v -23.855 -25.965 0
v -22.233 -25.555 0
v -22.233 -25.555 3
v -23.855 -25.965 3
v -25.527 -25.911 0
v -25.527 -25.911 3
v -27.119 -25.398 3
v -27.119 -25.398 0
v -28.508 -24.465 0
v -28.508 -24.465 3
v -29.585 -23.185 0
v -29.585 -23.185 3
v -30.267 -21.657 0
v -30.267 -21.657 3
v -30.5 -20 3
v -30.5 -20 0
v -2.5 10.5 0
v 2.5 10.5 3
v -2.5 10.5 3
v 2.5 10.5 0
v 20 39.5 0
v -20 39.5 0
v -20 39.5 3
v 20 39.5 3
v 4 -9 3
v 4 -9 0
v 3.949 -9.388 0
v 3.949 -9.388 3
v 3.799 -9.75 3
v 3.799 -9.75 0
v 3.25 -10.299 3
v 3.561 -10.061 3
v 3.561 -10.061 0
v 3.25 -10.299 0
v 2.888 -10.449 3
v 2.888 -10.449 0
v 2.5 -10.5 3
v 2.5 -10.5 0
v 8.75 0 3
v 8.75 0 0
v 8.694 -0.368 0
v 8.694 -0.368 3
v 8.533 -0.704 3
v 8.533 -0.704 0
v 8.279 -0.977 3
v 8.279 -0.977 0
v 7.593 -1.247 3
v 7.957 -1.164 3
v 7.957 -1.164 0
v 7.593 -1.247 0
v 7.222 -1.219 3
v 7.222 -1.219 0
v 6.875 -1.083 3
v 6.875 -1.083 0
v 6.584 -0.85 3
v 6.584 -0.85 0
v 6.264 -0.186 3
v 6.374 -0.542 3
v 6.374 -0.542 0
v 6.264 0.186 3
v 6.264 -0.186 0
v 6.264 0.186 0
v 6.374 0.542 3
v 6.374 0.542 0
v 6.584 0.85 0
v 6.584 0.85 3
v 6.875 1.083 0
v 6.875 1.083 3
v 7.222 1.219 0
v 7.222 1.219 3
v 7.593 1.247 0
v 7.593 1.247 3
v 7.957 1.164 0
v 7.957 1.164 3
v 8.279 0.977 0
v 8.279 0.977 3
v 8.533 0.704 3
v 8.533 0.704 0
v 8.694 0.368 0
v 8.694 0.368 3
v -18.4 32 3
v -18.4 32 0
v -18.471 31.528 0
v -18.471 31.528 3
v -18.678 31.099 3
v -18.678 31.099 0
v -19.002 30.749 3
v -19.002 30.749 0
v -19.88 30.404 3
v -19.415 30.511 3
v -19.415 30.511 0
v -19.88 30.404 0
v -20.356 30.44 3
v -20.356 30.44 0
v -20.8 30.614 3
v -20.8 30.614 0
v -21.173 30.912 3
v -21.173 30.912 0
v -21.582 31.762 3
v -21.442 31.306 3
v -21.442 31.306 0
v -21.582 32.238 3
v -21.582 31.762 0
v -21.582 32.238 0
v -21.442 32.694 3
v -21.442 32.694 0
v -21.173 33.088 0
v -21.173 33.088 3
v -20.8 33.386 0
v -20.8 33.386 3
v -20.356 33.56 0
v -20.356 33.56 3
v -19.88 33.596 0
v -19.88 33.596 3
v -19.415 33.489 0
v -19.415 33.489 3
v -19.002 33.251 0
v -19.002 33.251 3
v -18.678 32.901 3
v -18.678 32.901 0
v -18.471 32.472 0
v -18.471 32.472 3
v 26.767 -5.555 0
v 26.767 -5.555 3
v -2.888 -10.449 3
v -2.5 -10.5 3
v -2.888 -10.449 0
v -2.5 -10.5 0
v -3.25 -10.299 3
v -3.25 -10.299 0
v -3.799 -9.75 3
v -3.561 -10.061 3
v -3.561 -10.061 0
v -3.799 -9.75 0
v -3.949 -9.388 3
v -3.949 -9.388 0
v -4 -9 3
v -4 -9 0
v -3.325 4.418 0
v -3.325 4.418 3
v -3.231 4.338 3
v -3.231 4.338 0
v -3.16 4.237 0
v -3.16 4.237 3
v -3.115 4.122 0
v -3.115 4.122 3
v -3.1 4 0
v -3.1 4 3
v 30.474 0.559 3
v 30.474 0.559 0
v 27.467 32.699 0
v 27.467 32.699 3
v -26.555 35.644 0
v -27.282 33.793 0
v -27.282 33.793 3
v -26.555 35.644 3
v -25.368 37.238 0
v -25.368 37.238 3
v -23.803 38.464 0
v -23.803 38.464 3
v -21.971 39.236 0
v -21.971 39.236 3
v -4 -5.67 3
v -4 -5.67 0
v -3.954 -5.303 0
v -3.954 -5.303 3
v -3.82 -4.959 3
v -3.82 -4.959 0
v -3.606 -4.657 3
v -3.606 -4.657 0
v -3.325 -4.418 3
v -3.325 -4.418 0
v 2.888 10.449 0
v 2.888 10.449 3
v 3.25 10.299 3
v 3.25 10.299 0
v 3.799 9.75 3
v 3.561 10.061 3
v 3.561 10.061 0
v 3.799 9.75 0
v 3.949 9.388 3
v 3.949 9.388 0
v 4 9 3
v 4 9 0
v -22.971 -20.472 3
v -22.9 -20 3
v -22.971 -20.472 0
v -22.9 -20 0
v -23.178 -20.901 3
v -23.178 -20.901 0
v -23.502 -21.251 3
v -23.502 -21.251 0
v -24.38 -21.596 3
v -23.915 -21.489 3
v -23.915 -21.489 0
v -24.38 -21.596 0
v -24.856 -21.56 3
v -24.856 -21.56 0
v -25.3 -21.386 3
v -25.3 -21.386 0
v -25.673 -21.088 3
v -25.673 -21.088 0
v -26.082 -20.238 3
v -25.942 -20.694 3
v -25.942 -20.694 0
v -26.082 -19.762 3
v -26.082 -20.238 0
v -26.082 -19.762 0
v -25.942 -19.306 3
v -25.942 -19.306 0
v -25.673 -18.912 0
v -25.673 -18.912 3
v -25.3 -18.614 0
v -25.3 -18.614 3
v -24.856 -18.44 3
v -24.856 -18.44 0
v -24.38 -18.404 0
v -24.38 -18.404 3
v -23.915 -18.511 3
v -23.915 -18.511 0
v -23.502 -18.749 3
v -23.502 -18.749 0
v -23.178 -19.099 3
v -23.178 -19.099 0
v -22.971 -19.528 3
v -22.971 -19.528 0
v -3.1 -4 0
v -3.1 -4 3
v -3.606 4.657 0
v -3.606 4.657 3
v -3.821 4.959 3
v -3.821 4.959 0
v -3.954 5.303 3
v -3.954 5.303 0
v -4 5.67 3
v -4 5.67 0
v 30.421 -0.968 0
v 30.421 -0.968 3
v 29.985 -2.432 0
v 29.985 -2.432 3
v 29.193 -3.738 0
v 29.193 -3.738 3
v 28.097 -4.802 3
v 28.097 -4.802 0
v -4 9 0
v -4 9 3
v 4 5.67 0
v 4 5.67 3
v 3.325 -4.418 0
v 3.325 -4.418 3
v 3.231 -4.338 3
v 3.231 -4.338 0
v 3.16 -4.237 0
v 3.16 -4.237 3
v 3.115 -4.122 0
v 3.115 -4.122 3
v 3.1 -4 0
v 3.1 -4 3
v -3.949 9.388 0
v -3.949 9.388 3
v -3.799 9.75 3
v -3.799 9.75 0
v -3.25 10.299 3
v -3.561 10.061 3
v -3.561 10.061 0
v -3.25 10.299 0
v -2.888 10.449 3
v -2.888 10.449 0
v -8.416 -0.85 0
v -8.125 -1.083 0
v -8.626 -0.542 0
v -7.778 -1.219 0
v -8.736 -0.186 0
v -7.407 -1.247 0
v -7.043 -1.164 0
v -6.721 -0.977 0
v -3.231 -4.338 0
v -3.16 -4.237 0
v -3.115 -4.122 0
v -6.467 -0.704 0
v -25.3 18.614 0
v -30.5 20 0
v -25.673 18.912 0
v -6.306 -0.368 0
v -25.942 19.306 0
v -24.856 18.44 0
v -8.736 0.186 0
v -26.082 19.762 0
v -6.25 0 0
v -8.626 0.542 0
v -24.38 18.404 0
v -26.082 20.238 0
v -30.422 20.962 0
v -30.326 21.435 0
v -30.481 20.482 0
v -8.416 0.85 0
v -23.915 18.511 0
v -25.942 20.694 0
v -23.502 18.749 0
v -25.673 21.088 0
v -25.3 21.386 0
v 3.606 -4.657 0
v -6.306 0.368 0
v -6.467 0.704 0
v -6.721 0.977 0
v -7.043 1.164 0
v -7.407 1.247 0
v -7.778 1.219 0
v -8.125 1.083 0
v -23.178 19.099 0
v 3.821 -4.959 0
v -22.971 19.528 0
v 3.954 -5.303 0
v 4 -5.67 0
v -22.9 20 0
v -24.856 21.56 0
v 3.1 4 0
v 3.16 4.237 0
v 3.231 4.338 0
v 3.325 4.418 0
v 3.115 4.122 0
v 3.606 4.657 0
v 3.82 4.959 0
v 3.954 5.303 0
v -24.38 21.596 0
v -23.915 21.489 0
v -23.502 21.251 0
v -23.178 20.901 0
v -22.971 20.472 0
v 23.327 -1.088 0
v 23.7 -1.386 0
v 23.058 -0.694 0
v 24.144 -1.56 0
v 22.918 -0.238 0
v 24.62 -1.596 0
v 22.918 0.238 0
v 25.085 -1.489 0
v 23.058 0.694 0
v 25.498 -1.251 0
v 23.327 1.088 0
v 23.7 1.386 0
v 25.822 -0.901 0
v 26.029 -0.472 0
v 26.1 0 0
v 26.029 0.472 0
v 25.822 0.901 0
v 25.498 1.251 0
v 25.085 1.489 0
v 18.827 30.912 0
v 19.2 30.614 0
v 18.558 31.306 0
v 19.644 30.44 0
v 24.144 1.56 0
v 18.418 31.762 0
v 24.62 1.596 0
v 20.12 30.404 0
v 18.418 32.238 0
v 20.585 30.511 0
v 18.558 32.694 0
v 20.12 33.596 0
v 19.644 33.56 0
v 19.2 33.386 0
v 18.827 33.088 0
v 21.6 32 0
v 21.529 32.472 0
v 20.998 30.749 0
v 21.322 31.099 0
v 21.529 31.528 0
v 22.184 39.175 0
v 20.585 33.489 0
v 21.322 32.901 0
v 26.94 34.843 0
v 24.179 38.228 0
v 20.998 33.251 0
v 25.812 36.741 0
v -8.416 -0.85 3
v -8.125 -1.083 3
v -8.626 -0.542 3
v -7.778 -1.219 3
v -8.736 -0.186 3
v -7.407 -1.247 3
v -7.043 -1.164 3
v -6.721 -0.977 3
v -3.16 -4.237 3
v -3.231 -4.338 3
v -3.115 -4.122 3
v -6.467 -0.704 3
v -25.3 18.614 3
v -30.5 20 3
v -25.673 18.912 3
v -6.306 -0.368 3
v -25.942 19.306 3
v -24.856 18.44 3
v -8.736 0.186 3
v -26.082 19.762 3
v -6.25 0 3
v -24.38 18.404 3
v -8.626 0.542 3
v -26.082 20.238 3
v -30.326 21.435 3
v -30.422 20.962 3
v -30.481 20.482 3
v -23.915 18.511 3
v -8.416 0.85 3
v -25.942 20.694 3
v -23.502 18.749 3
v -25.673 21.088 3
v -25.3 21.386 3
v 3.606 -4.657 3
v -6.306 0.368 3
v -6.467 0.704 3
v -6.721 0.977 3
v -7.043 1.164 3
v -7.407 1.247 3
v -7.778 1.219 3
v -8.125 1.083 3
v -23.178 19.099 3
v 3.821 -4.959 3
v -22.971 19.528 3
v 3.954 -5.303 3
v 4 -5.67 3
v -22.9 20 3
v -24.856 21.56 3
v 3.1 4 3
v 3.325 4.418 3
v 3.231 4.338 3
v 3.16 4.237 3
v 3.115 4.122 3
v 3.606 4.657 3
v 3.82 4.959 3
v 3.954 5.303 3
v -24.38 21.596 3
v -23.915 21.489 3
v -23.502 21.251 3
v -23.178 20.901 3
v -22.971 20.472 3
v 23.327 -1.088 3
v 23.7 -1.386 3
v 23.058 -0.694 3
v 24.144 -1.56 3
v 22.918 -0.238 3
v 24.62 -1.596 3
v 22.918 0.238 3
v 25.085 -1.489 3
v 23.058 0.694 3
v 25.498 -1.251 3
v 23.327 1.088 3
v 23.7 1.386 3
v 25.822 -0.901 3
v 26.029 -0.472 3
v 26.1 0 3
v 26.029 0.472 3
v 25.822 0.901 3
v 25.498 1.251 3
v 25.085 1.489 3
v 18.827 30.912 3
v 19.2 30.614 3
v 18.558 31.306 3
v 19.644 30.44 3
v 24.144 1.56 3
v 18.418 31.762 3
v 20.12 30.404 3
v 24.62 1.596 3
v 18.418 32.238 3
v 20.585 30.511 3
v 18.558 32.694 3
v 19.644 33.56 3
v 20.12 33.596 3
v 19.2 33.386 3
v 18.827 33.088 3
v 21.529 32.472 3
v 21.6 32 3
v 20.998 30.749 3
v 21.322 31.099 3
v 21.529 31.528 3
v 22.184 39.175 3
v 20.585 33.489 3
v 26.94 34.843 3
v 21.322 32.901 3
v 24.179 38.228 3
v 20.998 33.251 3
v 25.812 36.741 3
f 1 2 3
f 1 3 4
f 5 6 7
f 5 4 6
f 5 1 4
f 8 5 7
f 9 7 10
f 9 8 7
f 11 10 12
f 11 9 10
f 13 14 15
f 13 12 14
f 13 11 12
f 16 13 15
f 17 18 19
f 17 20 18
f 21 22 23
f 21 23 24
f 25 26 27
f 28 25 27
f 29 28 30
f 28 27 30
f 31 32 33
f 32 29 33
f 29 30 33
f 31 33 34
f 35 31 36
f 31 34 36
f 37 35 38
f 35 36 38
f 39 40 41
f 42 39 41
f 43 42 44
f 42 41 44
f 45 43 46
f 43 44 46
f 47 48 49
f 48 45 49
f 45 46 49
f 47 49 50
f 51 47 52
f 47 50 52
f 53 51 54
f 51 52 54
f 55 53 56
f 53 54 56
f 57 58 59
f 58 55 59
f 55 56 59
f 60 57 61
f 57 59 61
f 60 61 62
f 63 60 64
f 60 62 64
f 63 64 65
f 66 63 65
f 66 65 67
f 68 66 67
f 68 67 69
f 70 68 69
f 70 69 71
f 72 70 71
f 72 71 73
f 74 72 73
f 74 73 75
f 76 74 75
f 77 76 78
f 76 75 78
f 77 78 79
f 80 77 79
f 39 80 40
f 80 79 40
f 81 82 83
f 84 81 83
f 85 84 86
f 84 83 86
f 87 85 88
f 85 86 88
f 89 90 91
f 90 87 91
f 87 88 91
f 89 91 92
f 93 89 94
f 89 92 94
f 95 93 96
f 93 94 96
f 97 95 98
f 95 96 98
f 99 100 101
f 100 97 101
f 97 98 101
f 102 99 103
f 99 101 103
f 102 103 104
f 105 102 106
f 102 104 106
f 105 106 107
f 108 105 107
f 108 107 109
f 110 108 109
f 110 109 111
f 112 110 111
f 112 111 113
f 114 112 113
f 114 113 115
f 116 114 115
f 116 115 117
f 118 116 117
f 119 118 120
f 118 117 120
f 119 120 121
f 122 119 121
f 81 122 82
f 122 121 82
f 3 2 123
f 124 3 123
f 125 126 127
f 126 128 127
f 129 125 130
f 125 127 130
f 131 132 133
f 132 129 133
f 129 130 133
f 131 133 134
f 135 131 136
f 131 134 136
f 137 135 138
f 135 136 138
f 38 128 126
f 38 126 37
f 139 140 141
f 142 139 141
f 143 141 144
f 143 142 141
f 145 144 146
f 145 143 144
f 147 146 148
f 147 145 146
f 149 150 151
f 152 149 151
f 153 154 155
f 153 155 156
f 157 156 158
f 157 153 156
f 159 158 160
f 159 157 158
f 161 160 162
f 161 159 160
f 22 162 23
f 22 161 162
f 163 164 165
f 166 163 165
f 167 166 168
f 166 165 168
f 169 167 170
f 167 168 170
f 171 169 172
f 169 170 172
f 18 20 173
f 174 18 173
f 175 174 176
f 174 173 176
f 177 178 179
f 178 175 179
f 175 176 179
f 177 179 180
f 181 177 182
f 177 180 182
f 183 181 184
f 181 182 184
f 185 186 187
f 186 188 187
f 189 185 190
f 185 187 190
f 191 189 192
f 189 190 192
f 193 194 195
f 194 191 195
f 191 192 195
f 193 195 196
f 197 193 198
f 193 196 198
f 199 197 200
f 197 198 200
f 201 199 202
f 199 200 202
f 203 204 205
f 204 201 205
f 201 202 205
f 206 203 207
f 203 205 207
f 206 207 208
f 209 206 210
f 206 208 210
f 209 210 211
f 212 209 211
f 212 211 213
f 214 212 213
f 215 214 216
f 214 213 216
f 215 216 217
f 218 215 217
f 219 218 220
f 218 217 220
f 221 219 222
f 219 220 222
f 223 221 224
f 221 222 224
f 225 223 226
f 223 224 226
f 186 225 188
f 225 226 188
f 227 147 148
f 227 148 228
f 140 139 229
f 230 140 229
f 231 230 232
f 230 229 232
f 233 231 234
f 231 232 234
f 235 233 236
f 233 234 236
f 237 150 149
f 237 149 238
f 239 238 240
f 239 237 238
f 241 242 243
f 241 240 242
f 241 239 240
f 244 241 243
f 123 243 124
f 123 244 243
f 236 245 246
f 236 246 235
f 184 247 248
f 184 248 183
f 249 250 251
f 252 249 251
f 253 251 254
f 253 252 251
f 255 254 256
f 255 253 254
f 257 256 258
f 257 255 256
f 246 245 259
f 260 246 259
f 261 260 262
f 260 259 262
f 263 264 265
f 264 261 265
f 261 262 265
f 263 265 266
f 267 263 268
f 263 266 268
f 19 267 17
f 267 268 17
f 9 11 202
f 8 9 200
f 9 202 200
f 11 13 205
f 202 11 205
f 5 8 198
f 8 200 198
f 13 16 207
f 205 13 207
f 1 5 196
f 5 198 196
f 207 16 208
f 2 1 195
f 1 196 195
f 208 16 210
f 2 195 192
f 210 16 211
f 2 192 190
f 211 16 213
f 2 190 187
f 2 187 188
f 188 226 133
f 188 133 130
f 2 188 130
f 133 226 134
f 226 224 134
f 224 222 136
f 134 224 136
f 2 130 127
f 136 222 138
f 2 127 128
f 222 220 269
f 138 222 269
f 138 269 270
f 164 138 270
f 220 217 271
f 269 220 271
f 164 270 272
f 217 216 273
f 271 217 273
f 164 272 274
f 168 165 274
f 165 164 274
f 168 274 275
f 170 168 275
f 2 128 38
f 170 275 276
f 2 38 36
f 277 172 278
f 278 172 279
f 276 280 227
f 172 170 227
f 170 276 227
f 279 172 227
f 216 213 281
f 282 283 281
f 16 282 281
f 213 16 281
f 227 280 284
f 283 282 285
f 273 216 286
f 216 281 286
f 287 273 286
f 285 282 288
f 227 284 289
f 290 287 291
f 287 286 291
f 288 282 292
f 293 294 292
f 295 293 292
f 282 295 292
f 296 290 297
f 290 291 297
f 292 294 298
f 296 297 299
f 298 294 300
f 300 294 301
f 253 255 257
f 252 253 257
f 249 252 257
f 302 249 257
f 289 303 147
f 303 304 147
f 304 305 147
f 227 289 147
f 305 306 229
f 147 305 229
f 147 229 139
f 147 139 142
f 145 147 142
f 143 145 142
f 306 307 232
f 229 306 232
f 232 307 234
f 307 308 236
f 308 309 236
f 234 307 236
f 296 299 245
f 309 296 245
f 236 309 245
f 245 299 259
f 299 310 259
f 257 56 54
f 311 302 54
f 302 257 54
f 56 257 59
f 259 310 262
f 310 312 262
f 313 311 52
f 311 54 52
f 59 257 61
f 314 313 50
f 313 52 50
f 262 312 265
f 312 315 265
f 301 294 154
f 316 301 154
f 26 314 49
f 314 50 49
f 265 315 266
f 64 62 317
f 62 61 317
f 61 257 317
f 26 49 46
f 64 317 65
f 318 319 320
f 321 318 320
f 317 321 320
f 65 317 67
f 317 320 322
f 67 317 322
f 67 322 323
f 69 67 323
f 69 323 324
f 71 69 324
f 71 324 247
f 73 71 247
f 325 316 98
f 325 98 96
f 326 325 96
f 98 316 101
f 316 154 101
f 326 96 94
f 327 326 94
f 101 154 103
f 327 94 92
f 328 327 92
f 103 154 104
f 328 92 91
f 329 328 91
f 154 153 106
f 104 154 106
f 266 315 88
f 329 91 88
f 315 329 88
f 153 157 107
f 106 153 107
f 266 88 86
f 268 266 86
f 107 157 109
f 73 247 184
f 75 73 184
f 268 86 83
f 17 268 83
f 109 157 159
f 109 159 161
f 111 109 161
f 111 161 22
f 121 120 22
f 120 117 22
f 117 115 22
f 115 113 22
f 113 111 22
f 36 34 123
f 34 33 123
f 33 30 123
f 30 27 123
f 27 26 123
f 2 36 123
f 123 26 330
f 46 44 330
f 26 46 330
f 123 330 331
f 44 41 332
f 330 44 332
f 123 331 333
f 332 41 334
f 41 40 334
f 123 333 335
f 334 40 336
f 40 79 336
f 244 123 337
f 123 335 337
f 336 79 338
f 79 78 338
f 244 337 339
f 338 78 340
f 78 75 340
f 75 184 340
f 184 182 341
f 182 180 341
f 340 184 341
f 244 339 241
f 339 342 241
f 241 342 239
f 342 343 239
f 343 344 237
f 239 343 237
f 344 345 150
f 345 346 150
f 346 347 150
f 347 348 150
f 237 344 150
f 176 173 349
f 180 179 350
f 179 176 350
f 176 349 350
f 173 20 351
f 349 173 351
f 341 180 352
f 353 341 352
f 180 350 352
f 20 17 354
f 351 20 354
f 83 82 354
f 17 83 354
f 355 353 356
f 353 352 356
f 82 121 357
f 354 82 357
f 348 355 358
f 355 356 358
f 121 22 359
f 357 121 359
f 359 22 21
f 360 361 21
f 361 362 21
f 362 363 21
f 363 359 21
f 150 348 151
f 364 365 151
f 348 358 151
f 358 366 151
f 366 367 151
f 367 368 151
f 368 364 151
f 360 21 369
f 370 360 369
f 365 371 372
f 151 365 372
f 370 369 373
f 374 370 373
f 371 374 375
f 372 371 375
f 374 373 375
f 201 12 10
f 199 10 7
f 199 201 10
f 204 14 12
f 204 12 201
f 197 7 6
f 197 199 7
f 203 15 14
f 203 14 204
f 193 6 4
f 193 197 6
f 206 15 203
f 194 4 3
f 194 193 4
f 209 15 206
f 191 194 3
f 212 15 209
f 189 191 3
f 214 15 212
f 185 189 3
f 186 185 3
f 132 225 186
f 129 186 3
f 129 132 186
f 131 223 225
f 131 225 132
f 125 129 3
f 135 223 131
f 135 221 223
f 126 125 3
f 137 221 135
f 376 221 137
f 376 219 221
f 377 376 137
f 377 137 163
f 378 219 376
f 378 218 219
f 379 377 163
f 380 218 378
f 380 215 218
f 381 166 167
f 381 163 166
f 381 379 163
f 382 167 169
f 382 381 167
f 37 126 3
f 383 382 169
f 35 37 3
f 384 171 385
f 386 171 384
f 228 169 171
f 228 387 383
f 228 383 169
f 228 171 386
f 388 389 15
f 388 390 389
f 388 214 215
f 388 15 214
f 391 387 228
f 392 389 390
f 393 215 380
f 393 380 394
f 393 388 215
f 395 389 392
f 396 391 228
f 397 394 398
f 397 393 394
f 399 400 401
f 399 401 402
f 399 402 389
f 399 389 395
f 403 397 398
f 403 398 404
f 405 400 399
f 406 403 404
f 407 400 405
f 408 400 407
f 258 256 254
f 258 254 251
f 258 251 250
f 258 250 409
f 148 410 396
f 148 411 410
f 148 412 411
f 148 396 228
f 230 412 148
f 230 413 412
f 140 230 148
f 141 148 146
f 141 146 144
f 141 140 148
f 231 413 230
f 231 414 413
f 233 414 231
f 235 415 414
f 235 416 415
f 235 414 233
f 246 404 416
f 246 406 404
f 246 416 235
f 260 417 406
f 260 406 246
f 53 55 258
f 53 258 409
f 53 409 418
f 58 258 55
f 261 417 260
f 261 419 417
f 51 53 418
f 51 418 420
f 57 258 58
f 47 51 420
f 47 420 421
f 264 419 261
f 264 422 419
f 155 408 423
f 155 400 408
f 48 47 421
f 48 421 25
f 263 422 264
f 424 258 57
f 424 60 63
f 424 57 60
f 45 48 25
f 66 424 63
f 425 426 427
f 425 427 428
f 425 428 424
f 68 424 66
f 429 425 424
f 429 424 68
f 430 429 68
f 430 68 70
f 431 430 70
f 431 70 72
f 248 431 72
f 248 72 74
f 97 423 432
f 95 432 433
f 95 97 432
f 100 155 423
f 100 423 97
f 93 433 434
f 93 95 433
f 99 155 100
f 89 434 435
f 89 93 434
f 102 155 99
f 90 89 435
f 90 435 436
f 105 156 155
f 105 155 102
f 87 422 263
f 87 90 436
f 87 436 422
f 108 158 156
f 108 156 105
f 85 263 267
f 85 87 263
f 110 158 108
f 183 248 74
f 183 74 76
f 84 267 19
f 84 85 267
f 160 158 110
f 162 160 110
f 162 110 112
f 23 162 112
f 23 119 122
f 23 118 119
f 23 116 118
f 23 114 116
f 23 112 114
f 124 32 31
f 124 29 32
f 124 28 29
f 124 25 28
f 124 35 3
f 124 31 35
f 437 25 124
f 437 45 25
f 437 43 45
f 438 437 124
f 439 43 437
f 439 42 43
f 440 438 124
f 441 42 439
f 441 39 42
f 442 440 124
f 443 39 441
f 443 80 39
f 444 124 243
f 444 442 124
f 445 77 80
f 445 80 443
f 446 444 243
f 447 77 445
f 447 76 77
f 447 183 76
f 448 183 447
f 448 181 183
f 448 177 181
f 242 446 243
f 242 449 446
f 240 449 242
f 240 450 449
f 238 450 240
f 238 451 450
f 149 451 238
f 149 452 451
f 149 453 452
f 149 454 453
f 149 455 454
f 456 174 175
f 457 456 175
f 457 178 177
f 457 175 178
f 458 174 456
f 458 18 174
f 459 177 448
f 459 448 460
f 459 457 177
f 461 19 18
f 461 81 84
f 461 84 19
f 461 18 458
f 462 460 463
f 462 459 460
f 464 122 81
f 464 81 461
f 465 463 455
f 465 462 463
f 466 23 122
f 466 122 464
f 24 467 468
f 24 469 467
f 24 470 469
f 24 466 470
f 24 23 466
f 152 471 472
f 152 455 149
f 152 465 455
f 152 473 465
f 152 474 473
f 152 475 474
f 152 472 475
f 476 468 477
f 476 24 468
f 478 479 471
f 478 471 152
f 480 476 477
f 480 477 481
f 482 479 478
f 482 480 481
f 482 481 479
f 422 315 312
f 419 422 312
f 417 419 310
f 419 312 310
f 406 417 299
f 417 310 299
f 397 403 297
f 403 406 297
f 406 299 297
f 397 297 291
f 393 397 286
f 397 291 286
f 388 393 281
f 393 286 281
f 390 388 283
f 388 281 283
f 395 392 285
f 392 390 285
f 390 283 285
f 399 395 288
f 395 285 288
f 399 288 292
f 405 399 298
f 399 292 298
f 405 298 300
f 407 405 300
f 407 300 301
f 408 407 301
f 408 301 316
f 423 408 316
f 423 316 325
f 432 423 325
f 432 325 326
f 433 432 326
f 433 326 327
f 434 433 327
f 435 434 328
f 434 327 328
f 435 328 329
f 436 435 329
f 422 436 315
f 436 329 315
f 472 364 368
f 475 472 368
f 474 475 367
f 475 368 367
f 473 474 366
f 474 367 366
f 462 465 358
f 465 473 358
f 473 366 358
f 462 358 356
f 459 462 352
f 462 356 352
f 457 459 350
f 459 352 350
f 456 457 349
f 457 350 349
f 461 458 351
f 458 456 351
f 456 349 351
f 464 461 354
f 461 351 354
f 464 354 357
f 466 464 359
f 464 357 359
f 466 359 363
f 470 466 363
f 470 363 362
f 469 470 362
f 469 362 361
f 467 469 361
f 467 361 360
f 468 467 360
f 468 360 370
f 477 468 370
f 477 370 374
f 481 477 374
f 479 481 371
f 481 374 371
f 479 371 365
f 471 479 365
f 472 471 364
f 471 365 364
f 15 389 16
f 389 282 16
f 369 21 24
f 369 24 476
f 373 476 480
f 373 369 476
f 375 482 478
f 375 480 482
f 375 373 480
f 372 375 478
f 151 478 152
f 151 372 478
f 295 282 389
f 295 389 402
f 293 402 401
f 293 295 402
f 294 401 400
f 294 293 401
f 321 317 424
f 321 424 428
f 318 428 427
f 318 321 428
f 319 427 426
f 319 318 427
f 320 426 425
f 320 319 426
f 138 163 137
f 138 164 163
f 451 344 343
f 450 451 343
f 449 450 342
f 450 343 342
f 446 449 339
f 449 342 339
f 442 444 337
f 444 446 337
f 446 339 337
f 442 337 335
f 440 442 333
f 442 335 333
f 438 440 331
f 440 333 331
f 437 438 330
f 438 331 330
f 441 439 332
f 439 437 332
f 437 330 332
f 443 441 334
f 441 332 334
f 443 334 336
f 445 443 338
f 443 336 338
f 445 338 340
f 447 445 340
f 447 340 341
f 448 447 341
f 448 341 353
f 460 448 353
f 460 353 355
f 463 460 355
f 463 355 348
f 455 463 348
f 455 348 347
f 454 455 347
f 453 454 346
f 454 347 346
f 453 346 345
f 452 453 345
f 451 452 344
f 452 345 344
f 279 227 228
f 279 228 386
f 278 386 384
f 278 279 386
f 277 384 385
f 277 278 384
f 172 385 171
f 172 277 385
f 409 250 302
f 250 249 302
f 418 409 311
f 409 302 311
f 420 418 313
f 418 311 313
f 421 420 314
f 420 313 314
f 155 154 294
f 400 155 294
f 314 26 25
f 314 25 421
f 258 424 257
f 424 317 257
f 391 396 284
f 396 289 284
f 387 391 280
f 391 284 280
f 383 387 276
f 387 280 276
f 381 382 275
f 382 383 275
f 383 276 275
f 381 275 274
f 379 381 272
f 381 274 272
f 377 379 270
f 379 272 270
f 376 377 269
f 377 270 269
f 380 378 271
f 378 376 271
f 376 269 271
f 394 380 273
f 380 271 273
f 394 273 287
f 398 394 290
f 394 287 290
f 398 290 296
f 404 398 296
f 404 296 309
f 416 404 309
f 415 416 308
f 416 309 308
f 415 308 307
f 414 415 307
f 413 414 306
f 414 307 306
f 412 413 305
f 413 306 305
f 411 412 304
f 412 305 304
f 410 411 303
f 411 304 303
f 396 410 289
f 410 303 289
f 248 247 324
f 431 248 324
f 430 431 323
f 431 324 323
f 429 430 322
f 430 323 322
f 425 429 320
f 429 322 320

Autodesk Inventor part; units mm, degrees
ref_plane "YZ Plane" through (0, 0, 0) normal (1, 0, 0) x (0, 1, 0)
ref_plane "XZ Plane" through (0, 0, 0) normal (0, 1, 0) x (-1, 0, 0)
ref_plane "XY Plane" through (0, 0, 0) normal (0, 0, 1) x (1, 0, 0)
sketch "スケッチ1" plane through (0, 0, 0) normal (0, 0, 1) x (1, 0, 0)
  line L0 (-15, 61.4764) -> (15, 61.4764) construction
  line L1 (15, 61.4764) -> (15, -42.9448) construction
  line L2 (15, -42.9448) -> (-15, -42.9448) construction
  line L3 (-15, -42.9448) -> (-15, 61.4764) construction
  circle A0 centre (-24.5, 20) radius 9.5 construction
  circle A1 centre (24.5, 0) radius 9.5 construction
  circle A2 centre (-24.5, -20) radius 9.5 construction
  line L4 (-3, 9.5) -> (3, 9.5) construction
  line L5 (3, 9.5) -> (3, -9.5) construction
  line L6 (3, -9.5) -> (-3, -9.5) construction
  line L7 (-3, -9.5) -> (-3, 9.5) construction
  circle A3 centre (-7.5, 0) radius 1.25
  circle A4 centre (7.5, 0) radius 1.25
  circle A5 centre (-20, 32) radius 1.6
  circle A6 centre (20, 32) radius 1.6
  line L8 (-24.5, 20) -> (-24.5, -20) construction
  line L9 (-24.5, -20) -> (24.5, 0) construction
  line L10 (24.5, 0) -> (-24.5, 20) construction
  line L11 (-61.4764, 39.5) -> (49.785, 39.5) construction
  line L12 (49.785, 39.5) -> (49.785, 24.5) construction
  line L13 (49.785, 24.5) -> (-61.4764, 24.5) construction
  line L14 (-61.4764, 24.5) -> (-61.4764, 39.5) construction
  circle A7 centre (-24.5, 20) radius 1.6
  circle A8 centre (24.5, 0) radius 1.6
  circle A9 centre (-24.5, -20) radius 1.6
  arc A10 (-20, 39.5) -> (-27.2824, 33.7934) centre (-20, 32) ccw
  arc A11 (27.4674, 32.6985) -> (20, 39.5) centre (20, 32) ccw
  arc A12 (-30.3259, 21.4347) -> (-30.5, 20) centre (-24.5, 20) ccw
  arc A13 (-30.5, -20) -> (-22.2326, -25.5551) centre (-24.5, -20) ccw
  arc A14 (26.7674, -5.5551) -> (30.4739, 0.5588) centre (24.5, 0) ccw
  line L15 (-20, 39.5) -> (20, 39.5)
  line L16 (-27.2824, 33.7934) -> (-30.3259, 21.4347)
  line L17 (-30.5, 20) -> (-30.5, -20)
  line L18 (-22.2326, -25.5551) -> (26.7674, -5.5551)
  line L19 (30.4739, 0.5588) -> (27.4674, 32.6985)
  line L20 (-2.5, -10.5) -> (2.5, -10.5)
  line L21 (4, -9) -> (4, -5.6703)
  line L22 (2.5, 10.5) -> (-2.5, 10.5)
  line L23 (-3.1, 4) -> (-3.1, -4)
  line L24 (3.1, 4) -> (3.1, -4)
  line L25 (-4, -5.6703) -> (-4, -9)
  line L26 (4, 5.6703) -> (4, 9)
  arc A15 (-2.5, 10.5) -> (-4, 9) centre (-2.5, 9) ccw
  arc A16 (4, 9) -> (2.5, 10.5) centre (2.5, 9) ccw
  arc A17 (-4, -9) -> (-2.5, -10.5) centre (-2.5, -9) ccw
  arc A18 (2.5, -10.5) -> (4, -9) centre (2.5, -9) ccw
  line L27 (-4, 9) -> (-4, 5.6703)
  arc A19 (-4, 5.6703) -> (-3.325, 4.4176) centre (-2.5, 5.6703) ccw
  arc A20 (-3.1, 4) -> (-3.325, 4.4176) centre (-3.6, 4) ccw
  arc A21 (3.325, 4.4176) -> (4, 5.6703) centre (2.5, 5.6703) ccw
  arc A22 (3.325, 4.4176) -> (3.1, 4) centre (3.6, 4) ccw
  arc A23 (-3.325, -4.4176) -> (-4, -5.6703) centre (-2.5, -5.6703) ccw
  arc A24 (-3.325, -4.4176) -> (-3.1, -4) centre (-3.6, -4) ccw
  arc A25 (3.1, -4) -> (3.325, -4.4176) centre (3.6, -4) ccw
  arc A26 (4, -5.6703) -> (3.325, -4.4176) centre (2.5, -5.6703) ccw
  circle A27 centre (-24.5, 20) radius 4 construction
  point P0 (0, 0)
  dimension "d0" = 30
  dimension "d1" = 15
  dimension "d2" = 19
  dimension "d3" = 19
  dimension "d4" = 19
  dimension "d5" = 6
  dimension "d6" = 19
  dimension "d7" = 3
  dimension "d8" = 9.5
  dimension "d9" = 2.5
  dimension "d10" = 2.5
  dimension "d11" = 15
  dimension "d12" = 7.5
  dimension "d13" = 3.2
  dimension "d14" = 3.2
  dimension "d15" = 40
  dimension "d16" = 40
  dimension "d17" = 20
  dimension "d18" = 12
  dimension "d19" = 15
  dimension "d20" = 7.5
  dimension "d21" = 3.2
  dimension "d22" = 3.2
  dimension "d23" = 3.2
  dimension "d24" = 7.5
  dimension "d25" = 7.5
  dimension "d26" = 6
  dimension "d27" = 6
  dimension "d28" = 6
  dimension "d29" = 1
  dimension "d32" = 8
  dimension "d33" = 4
  dimension "d34" = 0.1
  dimension "d35" = 0.1
  dimension "d36" = 1
  dimension "d37" = 1
  dimension "d38" = 1
  dimension "d39" = 1.5
  dimension "d40" = 1
  dimension "d41" = 1.5
  dimension "d42" = 0.5
  dimension "d44" = 1
  dimension "d45" = 1.5
  dimension "d46" = 0.5
  dimension "d47" = 1.5
  dimension "d48" = 0.5
  dimension "d49" = 0.5
  dimension "d50" = 1.5
  dimension "d54" = 8
extrude "押し出し1" add sketch "スケッチ1" along normal blind 3
equation "\"d8\" = 0.5 * d6"
equation "\"d12\" = 0.5 * d11"
equation "\"d17\" = 0.5 * d16"
properties part number "上昇機構_内側板" material "アルミニウム 6061"
